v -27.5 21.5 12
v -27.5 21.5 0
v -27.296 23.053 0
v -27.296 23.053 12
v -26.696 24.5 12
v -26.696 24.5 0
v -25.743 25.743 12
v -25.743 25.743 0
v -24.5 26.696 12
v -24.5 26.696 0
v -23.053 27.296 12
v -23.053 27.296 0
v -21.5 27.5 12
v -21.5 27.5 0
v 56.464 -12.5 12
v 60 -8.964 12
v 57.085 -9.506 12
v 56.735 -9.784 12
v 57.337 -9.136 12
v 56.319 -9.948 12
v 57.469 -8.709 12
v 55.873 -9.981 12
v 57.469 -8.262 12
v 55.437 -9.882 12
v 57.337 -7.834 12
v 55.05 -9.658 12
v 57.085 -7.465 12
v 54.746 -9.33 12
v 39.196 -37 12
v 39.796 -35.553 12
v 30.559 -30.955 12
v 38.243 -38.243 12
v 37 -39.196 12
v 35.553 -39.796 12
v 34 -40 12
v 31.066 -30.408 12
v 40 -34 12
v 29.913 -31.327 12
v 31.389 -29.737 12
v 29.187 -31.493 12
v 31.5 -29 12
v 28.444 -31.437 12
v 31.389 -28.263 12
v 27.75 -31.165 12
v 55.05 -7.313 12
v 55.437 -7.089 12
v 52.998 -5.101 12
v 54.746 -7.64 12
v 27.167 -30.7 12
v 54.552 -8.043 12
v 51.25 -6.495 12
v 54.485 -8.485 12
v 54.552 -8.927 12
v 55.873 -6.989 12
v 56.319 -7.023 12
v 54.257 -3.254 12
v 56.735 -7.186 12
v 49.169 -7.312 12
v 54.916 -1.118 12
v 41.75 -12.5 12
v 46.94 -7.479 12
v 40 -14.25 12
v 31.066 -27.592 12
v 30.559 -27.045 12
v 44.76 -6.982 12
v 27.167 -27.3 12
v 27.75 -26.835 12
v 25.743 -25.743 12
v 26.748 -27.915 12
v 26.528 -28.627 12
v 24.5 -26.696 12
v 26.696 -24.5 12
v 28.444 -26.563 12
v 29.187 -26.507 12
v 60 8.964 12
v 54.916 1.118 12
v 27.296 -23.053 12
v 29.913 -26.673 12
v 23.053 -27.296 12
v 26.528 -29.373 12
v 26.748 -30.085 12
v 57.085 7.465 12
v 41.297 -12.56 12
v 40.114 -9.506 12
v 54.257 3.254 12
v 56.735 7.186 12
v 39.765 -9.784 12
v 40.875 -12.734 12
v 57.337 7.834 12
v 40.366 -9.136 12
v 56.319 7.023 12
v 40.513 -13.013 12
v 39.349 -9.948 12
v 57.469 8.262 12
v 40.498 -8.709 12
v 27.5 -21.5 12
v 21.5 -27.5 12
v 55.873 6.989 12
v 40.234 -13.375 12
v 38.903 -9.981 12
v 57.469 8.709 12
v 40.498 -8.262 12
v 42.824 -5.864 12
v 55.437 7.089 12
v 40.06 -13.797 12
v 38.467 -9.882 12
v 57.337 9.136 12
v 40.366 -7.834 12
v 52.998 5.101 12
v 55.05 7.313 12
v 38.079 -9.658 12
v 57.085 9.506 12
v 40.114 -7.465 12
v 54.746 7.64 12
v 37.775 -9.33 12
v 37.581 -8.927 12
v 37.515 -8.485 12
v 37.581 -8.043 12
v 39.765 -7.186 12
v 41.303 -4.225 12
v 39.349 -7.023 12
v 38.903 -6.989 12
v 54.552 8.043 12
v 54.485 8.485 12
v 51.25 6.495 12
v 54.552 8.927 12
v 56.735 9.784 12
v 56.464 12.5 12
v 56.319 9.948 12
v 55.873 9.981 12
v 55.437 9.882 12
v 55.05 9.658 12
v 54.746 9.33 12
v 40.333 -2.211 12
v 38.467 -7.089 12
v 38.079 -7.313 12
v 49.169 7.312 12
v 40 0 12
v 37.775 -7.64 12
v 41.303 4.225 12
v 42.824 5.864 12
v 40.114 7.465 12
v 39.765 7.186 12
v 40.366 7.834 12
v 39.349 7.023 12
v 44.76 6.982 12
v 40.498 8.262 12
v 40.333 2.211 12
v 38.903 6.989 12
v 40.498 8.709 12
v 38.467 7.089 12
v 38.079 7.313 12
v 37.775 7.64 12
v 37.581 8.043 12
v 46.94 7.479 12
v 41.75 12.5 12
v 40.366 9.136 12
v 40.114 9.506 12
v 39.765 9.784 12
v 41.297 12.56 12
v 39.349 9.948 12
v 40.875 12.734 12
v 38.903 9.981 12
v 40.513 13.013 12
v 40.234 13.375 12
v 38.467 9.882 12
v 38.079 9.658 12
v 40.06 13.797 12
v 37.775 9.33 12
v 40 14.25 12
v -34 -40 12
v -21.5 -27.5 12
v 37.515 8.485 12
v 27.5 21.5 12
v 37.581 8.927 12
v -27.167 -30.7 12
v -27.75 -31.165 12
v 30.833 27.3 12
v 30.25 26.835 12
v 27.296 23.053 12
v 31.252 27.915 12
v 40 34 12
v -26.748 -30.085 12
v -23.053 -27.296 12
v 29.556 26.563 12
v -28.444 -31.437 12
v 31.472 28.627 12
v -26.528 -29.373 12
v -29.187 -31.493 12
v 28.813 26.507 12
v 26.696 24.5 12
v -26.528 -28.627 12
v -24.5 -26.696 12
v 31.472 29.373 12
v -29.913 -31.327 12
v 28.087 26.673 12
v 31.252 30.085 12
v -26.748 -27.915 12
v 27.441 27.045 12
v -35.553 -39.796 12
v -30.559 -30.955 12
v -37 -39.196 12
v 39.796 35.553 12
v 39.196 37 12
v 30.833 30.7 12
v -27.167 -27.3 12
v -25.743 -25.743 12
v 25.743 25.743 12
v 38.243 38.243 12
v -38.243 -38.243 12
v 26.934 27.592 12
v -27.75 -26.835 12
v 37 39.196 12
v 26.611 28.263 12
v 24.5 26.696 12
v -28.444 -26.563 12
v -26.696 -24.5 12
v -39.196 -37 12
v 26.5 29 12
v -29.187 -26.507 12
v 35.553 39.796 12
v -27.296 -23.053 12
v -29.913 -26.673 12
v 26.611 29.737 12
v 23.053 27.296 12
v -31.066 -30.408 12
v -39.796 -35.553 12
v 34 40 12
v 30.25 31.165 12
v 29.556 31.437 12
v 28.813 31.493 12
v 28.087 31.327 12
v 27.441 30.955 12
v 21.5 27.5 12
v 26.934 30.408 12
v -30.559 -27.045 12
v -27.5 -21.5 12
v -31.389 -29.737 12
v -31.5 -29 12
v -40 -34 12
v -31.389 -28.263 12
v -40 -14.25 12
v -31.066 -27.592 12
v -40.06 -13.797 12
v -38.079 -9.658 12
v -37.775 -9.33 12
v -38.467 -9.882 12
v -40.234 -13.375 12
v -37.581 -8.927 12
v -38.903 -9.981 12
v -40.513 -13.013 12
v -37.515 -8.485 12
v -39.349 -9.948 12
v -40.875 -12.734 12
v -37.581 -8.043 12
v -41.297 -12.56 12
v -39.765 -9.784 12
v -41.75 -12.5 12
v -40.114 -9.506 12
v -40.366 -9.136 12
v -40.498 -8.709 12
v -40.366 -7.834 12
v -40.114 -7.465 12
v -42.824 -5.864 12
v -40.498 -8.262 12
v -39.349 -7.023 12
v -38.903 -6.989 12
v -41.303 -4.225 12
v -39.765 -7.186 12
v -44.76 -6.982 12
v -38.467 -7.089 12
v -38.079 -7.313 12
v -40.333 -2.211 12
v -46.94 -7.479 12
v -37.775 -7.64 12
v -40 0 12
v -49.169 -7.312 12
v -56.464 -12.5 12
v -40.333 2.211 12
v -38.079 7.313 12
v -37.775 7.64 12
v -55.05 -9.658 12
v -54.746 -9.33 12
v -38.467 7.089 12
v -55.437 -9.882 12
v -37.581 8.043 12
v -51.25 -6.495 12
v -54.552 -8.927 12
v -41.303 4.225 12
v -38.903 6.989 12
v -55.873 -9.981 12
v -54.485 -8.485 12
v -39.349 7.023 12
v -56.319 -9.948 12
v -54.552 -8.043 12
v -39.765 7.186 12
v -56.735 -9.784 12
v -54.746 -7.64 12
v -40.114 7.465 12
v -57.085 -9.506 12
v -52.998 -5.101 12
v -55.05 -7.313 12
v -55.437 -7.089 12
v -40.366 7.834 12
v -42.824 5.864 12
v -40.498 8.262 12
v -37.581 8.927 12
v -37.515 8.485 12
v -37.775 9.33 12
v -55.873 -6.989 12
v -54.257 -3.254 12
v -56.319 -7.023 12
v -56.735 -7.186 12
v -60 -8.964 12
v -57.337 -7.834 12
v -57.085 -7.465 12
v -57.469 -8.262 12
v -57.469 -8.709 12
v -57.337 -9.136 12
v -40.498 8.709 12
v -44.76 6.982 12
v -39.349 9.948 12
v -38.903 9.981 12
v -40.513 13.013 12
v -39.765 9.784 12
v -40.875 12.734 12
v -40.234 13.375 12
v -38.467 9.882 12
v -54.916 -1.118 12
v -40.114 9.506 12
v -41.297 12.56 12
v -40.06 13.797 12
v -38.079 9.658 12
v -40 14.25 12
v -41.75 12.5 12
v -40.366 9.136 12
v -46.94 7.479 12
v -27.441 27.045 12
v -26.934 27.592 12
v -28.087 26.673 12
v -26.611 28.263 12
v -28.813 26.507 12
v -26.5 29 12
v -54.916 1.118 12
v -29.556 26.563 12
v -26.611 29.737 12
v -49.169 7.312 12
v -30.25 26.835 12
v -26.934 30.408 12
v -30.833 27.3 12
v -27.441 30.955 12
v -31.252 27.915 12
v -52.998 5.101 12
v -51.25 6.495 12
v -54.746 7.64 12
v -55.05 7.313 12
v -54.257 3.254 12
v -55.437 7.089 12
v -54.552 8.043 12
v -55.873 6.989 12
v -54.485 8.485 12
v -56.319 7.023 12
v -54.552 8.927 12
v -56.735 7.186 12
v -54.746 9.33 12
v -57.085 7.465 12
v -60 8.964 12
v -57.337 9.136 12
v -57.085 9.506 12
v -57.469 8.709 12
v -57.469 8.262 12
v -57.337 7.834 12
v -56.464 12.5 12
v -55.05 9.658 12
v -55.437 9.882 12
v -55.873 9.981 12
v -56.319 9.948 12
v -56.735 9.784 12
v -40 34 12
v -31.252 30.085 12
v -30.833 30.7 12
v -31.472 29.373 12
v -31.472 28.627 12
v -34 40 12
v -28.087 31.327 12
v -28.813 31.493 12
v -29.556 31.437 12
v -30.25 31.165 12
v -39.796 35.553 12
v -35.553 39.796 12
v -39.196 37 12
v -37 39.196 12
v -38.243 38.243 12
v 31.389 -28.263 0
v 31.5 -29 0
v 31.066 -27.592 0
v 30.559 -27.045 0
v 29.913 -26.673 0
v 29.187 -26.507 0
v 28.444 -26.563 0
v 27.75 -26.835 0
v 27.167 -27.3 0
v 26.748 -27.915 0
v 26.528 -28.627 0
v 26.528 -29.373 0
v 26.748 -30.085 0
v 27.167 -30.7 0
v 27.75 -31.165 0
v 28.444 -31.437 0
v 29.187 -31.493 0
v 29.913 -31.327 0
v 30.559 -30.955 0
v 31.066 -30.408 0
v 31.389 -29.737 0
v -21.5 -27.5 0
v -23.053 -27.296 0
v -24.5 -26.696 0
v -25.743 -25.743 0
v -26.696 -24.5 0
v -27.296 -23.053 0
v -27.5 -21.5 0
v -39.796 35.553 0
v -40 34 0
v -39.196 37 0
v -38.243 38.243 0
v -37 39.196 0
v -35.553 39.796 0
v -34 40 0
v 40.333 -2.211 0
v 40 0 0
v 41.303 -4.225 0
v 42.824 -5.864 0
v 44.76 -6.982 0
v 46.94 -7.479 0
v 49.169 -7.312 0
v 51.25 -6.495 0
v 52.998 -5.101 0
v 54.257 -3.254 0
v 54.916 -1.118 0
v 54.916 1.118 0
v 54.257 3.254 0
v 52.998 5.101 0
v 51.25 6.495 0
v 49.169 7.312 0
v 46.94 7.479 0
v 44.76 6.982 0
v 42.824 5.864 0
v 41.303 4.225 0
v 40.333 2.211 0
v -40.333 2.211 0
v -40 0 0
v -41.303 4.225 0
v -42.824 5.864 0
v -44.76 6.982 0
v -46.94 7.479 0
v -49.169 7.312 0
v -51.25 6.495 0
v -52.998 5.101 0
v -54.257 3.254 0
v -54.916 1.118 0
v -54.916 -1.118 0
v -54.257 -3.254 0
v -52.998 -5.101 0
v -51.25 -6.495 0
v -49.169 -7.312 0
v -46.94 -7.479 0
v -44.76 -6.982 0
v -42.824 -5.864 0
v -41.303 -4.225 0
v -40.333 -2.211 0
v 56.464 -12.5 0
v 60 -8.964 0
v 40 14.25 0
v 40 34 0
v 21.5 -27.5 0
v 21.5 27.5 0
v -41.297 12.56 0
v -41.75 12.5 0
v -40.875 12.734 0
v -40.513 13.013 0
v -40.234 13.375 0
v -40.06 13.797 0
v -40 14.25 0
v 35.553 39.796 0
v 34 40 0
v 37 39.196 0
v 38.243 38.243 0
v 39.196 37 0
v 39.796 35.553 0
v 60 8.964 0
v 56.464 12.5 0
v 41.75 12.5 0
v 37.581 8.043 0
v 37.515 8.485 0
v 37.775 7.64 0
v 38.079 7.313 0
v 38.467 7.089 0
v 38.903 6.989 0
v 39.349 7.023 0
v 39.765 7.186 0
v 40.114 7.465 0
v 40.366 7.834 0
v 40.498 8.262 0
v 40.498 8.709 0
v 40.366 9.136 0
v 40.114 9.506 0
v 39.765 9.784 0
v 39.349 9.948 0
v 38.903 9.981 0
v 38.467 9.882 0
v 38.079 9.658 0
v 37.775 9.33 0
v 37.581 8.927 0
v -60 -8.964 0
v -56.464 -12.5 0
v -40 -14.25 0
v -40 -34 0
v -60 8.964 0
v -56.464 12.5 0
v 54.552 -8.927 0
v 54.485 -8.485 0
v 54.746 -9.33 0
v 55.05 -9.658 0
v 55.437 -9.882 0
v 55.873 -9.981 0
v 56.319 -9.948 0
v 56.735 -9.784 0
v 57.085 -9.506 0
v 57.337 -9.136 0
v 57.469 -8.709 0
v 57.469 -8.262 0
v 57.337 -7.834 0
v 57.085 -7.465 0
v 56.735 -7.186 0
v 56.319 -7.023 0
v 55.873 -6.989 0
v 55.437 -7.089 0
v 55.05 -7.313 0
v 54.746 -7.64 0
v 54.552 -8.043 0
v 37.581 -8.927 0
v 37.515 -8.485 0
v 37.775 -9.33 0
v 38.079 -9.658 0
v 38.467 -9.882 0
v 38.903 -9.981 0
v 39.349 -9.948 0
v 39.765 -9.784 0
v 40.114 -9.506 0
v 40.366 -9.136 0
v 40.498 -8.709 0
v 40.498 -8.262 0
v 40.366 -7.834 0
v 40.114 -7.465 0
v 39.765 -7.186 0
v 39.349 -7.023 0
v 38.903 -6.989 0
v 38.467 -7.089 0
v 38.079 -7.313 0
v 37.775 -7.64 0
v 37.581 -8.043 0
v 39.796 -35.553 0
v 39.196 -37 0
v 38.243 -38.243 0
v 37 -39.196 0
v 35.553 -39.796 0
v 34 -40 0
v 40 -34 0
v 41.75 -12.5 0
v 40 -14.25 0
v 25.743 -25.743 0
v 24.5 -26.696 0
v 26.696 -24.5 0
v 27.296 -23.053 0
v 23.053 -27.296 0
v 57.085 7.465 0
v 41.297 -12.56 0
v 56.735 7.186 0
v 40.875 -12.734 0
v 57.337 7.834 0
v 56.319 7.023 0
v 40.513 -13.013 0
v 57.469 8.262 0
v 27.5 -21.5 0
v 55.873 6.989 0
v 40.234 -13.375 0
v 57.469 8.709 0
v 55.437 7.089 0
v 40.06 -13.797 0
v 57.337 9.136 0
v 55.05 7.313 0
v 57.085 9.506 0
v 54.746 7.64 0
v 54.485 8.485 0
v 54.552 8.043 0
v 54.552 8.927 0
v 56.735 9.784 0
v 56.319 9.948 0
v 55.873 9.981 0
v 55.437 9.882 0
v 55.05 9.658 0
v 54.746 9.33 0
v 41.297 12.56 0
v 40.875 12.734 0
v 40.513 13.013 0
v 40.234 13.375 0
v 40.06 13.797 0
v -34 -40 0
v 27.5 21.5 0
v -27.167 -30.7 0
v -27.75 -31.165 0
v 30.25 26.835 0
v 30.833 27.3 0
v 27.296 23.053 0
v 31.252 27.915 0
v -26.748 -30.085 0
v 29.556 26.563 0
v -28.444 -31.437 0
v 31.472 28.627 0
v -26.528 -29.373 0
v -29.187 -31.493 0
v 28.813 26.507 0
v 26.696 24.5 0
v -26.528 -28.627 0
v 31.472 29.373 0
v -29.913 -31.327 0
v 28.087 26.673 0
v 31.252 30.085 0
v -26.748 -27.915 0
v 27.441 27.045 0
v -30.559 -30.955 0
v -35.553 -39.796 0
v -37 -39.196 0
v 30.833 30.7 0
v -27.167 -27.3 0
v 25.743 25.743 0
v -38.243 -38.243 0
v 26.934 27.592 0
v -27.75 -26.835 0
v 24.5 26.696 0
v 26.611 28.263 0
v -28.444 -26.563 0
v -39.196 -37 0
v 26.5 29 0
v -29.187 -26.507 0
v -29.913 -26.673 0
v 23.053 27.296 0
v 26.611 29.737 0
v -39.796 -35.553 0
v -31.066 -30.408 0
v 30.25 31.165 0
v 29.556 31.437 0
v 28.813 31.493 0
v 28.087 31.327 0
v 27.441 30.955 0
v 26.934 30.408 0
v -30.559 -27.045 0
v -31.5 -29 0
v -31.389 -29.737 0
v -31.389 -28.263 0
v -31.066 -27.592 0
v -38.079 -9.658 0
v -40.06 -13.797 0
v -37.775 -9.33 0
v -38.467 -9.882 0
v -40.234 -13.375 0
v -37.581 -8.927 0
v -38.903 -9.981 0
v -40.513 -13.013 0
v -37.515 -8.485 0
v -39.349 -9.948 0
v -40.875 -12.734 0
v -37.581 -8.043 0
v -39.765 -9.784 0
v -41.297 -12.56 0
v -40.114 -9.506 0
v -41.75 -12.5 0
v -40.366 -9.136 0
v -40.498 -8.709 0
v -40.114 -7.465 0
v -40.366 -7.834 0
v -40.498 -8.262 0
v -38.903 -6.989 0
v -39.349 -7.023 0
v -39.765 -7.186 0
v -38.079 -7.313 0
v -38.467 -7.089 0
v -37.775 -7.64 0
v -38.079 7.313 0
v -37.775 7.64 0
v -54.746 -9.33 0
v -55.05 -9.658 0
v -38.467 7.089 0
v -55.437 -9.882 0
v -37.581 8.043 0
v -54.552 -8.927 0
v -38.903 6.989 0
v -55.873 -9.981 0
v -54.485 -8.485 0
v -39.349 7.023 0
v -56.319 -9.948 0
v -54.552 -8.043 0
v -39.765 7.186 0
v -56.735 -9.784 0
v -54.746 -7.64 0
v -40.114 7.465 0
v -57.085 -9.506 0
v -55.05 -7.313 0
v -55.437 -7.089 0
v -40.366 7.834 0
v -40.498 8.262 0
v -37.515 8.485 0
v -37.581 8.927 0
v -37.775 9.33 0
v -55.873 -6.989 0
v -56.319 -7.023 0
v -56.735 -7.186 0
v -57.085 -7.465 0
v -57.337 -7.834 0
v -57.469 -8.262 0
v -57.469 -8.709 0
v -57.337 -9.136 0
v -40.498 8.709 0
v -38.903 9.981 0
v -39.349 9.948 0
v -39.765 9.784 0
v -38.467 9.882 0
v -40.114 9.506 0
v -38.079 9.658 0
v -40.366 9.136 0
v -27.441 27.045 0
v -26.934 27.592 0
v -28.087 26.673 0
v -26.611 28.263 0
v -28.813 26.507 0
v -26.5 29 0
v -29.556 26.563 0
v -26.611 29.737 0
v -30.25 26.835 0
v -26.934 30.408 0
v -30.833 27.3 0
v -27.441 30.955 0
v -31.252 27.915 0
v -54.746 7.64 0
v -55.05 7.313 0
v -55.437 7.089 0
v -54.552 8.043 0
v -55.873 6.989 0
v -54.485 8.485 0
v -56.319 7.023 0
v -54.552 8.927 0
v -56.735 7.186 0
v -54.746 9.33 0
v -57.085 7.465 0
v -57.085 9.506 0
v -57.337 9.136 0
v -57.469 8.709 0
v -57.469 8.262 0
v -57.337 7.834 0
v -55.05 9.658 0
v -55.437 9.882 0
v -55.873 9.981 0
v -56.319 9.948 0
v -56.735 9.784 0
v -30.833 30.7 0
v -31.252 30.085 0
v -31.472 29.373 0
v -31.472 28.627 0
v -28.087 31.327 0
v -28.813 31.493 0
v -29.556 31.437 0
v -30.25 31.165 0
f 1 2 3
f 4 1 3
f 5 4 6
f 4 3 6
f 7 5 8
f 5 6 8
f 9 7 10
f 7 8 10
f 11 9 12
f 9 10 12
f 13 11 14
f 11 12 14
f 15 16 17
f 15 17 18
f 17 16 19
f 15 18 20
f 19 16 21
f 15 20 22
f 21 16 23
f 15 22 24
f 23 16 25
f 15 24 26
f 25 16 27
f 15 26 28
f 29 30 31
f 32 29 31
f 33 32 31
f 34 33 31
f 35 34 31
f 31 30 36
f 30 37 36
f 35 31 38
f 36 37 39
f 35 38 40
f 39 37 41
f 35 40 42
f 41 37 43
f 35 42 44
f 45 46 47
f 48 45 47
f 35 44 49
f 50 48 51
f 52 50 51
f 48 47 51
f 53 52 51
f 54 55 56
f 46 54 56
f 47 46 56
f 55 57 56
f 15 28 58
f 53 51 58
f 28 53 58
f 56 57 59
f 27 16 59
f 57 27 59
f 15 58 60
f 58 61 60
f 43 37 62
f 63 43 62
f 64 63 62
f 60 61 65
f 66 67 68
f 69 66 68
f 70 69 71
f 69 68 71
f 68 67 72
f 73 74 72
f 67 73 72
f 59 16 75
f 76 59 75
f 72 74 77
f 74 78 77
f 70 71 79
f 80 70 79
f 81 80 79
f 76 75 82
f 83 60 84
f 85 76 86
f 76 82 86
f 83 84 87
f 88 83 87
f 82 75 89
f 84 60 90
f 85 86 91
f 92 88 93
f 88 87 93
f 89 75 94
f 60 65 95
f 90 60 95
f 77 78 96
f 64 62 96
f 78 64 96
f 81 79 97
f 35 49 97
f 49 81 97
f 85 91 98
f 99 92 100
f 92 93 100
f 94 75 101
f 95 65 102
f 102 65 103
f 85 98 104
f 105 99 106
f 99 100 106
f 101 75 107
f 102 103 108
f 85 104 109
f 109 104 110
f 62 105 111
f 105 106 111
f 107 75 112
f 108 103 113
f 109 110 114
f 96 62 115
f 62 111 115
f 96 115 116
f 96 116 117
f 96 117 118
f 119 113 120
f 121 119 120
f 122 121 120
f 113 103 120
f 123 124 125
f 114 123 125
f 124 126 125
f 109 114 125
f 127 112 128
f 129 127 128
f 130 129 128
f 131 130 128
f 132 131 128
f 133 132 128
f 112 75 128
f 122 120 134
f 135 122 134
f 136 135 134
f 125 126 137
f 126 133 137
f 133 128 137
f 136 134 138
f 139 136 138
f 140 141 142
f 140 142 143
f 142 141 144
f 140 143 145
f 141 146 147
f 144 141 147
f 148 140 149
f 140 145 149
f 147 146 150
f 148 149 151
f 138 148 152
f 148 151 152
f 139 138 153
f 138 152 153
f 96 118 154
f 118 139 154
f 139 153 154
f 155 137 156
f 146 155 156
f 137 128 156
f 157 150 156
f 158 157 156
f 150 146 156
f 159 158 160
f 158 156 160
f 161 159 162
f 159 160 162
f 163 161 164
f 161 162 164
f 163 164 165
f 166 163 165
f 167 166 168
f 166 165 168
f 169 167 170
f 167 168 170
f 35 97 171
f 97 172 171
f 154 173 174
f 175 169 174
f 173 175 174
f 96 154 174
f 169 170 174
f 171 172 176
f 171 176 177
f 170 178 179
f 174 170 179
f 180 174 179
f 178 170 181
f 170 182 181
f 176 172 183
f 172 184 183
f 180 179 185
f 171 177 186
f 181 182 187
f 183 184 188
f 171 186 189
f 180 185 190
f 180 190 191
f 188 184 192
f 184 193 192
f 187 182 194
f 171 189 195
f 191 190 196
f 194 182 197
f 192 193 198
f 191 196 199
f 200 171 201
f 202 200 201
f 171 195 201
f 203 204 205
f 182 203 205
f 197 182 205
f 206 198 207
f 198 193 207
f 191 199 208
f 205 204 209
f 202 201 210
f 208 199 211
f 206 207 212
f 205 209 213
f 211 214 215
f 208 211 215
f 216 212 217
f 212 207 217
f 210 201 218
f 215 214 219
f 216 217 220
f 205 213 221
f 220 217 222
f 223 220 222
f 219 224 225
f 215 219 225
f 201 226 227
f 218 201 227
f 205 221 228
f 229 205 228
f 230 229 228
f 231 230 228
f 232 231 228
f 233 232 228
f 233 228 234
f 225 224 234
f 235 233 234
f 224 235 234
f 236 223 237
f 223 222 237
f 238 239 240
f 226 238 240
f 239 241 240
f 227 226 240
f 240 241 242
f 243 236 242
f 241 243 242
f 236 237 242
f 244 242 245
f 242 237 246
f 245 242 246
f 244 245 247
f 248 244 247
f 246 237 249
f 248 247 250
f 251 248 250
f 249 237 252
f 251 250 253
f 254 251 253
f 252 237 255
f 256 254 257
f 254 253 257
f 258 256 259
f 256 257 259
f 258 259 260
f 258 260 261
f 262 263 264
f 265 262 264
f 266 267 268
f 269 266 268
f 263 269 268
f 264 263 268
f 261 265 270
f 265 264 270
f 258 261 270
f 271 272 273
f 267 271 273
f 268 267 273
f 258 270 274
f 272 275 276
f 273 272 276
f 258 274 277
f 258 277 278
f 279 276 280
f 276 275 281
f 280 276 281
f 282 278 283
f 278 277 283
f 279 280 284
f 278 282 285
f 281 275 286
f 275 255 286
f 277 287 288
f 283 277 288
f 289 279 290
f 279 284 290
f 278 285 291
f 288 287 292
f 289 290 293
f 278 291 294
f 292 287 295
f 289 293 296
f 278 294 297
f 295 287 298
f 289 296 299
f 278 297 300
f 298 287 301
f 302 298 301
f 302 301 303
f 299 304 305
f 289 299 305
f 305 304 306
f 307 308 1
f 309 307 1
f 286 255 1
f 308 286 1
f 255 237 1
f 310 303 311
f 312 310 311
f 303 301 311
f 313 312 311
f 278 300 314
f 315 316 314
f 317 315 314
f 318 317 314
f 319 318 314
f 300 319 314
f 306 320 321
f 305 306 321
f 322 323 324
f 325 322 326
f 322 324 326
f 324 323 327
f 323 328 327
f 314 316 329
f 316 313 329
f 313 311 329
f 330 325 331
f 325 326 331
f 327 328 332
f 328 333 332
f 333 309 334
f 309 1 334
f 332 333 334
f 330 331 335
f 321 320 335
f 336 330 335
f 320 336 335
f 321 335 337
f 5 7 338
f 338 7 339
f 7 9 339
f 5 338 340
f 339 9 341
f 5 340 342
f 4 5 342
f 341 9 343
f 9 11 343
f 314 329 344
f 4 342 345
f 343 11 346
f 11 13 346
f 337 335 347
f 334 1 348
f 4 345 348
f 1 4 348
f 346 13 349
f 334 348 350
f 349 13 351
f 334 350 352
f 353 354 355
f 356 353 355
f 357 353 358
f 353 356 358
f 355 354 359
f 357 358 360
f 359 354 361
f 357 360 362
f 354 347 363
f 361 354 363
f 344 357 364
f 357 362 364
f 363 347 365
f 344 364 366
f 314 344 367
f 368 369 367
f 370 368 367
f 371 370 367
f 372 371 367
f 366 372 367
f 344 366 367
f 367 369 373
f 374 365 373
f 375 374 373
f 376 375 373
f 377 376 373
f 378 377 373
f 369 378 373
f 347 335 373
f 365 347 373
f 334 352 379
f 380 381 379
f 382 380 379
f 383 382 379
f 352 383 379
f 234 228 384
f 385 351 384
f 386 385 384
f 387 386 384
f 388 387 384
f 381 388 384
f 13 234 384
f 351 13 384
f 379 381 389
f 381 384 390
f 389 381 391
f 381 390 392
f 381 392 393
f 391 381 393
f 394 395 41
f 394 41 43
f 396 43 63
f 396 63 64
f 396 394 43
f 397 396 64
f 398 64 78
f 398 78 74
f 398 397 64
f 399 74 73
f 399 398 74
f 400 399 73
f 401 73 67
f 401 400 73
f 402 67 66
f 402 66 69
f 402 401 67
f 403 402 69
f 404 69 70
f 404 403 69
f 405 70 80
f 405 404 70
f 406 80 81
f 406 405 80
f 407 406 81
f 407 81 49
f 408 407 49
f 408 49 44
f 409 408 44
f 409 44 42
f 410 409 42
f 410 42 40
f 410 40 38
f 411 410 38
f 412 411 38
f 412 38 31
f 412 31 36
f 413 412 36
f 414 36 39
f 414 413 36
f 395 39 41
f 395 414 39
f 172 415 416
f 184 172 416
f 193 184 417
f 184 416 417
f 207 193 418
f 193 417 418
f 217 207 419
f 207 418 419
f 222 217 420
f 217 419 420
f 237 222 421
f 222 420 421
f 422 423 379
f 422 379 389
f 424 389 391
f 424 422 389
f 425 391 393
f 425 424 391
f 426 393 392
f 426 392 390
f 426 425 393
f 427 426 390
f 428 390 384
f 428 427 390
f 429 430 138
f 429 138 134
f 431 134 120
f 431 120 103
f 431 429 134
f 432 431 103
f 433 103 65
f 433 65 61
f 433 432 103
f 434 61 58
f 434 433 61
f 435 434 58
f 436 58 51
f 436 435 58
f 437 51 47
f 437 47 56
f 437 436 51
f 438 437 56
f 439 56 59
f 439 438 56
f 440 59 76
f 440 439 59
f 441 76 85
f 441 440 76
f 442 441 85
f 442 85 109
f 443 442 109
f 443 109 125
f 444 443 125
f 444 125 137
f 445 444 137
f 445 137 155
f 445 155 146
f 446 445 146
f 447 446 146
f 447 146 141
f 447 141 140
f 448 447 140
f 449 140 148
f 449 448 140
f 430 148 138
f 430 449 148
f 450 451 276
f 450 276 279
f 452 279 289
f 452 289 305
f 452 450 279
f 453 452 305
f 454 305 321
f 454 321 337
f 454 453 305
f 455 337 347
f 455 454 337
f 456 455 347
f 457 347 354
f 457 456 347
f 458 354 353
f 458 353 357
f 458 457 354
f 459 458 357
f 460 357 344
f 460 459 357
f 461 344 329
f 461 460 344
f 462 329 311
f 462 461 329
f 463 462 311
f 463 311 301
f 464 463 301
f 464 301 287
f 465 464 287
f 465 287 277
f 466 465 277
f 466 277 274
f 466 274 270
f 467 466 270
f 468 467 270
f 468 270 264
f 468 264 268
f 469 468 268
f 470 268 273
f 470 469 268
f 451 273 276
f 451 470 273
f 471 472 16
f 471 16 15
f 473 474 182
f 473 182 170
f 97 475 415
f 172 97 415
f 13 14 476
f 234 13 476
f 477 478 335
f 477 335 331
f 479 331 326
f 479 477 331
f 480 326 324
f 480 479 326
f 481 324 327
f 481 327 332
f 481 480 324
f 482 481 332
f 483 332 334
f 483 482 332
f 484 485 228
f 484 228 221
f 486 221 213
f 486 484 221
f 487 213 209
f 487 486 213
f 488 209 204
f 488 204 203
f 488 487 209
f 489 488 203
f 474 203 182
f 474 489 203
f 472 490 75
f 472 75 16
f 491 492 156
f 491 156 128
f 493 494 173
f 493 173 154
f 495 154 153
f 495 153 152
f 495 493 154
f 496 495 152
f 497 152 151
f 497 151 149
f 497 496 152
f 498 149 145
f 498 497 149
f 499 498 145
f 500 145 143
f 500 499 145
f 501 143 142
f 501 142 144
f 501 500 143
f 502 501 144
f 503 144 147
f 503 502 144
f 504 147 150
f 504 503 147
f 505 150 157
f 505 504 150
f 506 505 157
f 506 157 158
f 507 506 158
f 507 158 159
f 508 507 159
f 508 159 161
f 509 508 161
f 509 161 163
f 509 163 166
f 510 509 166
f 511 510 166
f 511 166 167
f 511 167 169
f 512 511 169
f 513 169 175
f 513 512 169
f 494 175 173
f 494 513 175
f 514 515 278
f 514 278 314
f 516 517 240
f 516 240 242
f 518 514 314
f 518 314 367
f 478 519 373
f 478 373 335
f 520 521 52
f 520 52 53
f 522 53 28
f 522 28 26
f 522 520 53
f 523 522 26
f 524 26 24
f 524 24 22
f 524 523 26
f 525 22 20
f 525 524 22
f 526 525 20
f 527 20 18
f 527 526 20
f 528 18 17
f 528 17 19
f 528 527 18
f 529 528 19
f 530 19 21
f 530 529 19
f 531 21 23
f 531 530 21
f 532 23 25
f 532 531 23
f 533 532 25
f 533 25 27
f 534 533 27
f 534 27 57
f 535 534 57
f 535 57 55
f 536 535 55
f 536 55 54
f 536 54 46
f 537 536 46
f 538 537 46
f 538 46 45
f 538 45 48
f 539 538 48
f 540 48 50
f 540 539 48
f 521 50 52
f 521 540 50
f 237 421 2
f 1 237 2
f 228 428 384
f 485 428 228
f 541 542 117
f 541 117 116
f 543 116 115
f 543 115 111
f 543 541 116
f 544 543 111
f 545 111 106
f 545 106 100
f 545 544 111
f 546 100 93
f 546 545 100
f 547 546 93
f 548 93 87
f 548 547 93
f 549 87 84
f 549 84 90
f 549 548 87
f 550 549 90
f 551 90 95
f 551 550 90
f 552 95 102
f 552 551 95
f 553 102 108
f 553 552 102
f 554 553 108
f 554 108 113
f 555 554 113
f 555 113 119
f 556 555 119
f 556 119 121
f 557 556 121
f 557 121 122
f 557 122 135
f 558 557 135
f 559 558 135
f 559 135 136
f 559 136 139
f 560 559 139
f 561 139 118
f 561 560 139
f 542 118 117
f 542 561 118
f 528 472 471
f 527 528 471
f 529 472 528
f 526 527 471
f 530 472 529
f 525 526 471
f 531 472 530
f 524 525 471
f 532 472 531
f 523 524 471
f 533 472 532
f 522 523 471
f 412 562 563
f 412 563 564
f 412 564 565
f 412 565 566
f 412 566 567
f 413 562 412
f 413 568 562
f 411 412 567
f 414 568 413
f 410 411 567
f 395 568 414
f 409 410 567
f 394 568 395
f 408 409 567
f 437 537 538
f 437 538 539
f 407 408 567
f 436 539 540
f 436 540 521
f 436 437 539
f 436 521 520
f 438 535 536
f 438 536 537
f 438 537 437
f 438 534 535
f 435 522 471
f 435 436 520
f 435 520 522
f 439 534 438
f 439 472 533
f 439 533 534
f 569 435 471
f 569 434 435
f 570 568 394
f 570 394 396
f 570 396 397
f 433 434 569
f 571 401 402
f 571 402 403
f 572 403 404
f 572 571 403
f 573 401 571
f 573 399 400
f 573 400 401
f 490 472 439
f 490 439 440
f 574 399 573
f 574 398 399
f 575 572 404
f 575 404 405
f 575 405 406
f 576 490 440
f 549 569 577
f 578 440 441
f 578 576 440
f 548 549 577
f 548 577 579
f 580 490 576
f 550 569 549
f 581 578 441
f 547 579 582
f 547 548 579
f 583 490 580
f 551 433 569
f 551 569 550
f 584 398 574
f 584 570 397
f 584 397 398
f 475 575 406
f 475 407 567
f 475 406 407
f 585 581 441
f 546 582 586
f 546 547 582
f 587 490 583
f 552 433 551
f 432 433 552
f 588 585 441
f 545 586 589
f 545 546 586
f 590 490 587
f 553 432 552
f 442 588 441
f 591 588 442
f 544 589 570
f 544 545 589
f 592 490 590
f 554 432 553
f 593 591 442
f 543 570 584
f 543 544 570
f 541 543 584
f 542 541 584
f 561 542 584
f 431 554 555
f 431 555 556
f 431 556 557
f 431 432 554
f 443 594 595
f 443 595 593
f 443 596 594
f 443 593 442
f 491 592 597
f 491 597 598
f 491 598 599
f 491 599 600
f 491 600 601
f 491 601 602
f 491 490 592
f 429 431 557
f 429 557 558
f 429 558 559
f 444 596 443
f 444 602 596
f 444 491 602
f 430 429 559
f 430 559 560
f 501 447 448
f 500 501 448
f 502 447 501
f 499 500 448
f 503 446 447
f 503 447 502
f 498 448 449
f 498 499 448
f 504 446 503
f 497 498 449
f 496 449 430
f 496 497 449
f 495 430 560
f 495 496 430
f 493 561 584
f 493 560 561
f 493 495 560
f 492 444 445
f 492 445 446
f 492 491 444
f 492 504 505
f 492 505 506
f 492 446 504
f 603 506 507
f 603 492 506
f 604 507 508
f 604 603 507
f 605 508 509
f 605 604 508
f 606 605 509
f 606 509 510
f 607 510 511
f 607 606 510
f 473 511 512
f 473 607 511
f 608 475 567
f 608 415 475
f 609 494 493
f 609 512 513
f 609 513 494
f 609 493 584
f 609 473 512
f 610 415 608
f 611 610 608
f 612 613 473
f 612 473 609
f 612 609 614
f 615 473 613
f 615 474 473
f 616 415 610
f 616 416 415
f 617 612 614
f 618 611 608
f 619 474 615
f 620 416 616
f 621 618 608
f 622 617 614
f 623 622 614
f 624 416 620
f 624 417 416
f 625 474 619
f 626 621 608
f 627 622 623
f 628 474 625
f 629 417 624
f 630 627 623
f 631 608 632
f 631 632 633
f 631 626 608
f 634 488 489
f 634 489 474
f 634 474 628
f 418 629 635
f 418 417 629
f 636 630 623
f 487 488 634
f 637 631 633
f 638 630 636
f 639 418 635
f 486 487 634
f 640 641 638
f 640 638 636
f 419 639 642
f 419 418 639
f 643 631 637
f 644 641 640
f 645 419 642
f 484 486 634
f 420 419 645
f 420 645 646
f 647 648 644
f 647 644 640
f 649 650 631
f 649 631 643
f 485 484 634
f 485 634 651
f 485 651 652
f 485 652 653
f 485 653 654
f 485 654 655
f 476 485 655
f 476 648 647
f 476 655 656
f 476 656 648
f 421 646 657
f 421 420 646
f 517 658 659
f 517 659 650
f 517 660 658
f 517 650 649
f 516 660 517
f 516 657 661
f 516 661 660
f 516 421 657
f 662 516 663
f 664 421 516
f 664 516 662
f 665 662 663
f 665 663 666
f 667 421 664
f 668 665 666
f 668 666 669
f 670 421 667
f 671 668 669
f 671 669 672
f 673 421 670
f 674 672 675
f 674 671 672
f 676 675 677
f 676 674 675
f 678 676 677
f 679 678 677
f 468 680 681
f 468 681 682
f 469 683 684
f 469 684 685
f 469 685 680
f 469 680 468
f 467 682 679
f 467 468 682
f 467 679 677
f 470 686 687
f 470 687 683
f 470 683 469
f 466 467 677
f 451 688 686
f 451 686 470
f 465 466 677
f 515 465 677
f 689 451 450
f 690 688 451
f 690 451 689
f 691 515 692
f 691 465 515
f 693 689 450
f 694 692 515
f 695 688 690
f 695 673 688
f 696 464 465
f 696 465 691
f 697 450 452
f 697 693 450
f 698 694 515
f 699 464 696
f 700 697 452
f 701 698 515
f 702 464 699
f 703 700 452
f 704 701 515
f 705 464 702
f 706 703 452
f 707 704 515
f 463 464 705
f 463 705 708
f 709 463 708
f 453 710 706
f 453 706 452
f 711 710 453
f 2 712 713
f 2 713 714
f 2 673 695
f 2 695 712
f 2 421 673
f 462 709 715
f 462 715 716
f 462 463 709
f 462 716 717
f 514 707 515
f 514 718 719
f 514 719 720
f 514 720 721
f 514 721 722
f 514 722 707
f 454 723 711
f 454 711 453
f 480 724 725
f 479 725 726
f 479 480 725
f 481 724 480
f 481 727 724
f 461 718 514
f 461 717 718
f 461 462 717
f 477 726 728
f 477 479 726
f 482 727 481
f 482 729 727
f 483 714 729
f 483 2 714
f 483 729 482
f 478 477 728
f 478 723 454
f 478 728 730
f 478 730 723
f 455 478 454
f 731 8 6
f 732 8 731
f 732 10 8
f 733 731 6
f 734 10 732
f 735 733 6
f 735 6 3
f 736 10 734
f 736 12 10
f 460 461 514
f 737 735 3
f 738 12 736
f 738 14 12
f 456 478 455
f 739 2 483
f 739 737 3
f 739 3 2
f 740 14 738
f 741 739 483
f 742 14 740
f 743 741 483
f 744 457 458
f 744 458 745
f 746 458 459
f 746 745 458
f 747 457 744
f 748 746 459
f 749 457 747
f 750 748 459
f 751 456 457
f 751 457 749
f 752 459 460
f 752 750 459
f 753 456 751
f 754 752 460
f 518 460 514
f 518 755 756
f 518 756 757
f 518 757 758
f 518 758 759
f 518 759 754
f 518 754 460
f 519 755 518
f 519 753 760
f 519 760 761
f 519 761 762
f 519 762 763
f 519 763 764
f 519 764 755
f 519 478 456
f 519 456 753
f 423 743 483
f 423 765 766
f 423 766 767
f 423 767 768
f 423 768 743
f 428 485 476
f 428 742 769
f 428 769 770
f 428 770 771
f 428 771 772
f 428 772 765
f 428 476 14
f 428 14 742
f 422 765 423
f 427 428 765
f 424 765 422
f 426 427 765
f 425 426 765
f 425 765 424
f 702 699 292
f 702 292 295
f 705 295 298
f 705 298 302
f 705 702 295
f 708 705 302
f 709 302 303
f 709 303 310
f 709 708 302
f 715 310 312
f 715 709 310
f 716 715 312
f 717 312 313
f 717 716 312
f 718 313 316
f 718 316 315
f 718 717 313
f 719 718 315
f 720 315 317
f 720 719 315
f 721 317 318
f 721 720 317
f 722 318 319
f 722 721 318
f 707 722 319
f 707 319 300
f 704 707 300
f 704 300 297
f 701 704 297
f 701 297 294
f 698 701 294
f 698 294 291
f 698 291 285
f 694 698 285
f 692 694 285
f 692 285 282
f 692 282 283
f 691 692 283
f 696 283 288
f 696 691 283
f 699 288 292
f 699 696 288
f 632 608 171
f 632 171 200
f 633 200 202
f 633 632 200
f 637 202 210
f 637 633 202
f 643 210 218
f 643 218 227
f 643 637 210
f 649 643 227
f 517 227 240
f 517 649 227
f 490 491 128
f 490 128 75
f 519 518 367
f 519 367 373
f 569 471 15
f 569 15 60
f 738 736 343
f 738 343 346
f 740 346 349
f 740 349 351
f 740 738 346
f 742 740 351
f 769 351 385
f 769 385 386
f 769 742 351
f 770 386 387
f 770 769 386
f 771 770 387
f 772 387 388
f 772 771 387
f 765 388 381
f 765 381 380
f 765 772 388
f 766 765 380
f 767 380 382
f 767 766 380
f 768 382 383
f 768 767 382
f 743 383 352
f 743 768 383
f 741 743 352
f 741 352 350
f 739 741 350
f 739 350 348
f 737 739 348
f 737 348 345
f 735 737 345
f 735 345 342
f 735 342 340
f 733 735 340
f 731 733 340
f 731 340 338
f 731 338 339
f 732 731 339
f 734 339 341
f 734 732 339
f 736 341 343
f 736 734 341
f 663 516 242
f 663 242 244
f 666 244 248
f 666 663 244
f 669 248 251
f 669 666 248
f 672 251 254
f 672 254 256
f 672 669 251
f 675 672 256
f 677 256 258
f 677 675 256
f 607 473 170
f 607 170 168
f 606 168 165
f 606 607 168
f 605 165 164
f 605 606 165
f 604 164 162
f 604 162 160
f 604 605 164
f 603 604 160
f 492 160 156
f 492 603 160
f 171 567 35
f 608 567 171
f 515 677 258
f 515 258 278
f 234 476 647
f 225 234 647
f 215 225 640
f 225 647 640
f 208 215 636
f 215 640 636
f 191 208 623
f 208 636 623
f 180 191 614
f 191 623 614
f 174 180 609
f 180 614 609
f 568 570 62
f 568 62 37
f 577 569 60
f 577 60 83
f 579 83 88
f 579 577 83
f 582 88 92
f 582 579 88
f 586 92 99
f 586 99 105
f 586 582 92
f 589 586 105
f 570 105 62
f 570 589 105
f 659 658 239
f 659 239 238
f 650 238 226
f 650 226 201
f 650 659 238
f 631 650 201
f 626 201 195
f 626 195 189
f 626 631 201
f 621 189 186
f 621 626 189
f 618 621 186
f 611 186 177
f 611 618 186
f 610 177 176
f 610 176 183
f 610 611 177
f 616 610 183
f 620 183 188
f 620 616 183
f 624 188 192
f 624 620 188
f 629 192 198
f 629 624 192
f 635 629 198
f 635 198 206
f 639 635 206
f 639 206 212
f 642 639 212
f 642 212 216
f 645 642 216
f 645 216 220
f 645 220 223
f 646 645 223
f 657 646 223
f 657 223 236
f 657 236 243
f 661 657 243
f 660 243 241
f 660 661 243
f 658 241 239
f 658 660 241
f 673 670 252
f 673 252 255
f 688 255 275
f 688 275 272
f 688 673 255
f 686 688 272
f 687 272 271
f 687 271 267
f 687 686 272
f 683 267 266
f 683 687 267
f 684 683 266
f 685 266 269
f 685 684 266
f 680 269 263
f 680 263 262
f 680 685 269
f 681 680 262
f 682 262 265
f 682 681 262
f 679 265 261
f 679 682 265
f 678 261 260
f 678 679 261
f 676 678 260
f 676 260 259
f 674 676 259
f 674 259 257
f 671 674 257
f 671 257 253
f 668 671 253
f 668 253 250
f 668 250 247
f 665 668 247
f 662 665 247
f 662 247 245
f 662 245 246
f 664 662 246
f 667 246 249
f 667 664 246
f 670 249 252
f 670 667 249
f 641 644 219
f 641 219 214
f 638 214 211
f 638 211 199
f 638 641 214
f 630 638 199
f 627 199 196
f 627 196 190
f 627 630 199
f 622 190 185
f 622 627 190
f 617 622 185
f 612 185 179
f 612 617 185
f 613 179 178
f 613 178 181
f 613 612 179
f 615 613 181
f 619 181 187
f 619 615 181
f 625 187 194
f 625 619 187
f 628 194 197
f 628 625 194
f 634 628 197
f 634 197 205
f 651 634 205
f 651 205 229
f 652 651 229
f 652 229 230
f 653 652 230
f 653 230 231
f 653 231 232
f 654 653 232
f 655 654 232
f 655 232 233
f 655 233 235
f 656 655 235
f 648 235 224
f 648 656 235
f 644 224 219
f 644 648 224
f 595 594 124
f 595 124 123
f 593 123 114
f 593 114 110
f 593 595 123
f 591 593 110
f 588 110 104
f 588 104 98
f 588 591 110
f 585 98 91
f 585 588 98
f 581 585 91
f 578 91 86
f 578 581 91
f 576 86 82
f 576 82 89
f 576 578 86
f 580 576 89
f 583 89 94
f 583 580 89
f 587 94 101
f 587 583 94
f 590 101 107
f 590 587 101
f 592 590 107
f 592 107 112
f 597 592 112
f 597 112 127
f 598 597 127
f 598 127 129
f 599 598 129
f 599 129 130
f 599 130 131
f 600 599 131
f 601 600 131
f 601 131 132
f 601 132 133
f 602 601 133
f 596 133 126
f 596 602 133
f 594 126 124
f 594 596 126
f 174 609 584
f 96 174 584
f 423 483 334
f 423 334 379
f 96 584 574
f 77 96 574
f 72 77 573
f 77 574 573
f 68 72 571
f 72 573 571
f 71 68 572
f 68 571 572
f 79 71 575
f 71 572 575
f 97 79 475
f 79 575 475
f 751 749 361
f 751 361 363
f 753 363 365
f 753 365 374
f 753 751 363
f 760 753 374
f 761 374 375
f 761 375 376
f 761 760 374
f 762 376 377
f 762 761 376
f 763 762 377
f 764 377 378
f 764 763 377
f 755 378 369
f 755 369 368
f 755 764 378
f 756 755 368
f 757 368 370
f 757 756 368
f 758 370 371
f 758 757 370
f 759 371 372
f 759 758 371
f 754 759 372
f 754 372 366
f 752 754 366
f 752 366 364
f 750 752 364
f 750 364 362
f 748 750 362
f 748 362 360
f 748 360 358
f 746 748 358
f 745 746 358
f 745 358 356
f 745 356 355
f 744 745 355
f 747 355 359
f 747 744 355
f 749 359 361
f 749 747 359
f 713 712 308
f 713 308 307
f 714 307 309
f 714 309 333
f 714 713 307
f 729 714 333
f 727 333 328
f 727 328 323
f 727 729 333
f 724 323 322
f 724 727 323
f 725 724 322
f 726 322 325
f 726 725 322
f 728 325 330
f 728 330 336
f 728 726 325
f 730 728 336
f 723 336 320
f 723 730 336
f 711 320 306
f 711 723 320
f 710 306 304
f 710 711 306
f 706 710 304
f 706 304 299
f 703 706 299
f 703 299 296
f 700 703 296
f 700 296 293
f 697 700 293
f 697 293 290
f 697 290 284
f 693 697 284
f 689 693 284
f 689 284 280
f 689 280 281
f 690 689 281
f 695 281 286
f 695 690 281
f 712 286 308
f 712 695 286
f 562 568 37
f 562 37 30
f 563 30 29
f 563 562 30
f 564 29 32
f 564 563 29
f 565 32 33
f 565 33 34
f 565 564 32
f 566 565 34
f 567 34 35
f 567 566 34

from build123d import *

# Parameters (mm, degrees)
SKETCH1_R               = 7.5
SKETCH1_R_2             = 1.5
SKETCH1_R_3             = 2.5
BOSS_EXTRUDE1_DEPTH     = 12
CUT_EXTRUDE1_DEPTH      = 74.10266753
CUT_EXTRUDE1_DEPTH_BACK = 74.10266753


with BuildPart() as part:
    # Sketch1 → Boss-Extrude1 (new body)
    with BuildSketch(Plane.XY):
        with BuildLine():
            Line((-56.464466094, 12.5), (-41.75, 12.5))
            ThreePointArc((-41.75, 12.5), (-40.512563133, 13.012563133), (-40, 14.25))
            Line((-40, 14.25), (-40, 34))
            ThreePointArc((-40, 34), (-38.242640687, 38.242640687), (-34, 40))
            Line((-34, 40), (34, 40))
            ThreePointArc((34, 40), (38.242640687, 38.242640687), (40, 34))
            Line((40, 34), (40, 14.25))
            ThreePointArc((40, 14.25), (40.512563133, 13.012563133), (41.75, 12.5))
            Line((41.75, 12.5), (56.464466094, 12.5))
            Line((56.464466094, 12.5), (60, 8.964466094))
            Line((60, 8.964466094), (60, -8.964466094))
            Line((60, -8.964466094), (56.464466094, -12.5))
            Line((56.464466094, -12.5), (41.75, -12.5))
            ThreePointArc((41.75, -12.5), (40.512563133, -13.012563133), (40, -14.25))
            Line((40, -14.25), (40, -34))
            ThreePointArc((40, -34), (38.242640687, -38.242640687), (34, -40))
            Line((34, -40), (-34, -40))
            ThreePointArc((-34, -40), (-38.242640687, -38.242640687), (-40, -34))
            Line((-40, -34), (-40, -14.25))
            ThreePointArc((-40, -14.25), (-40.512563133, -13.012563133), (-41.75, -12.5))
            Line((-41.75, -12.5), (-56.464466094, -12.5))
            Line((-56.464466094, -12.5), (-60, -8.964466094))
            Line((-60, -8.964466094), (-60, 8.964466094))
            Line((-60, 8.964466094), (-56.464466094, 12.5))
        make_face()
        with Locations((-47.5, 0)):
            Circle(SKETCH1_R, mode=Mode.SUBTRACT)
        with Locations(Location((47.5, 0, 0), (0, 0, 180))):
            Circle(SKETCH1_R, mode=Mode.SUBTRACT)
        with Locations((-55.985281374, 8.485281374)):
            Circle(SKETCH1_R_2, mode=Mode.SUBTRACT)
        with Locations((-39.014718626, -8.485281374)):
            Circle(SKETCH1_R_2, mode=Mode.SUBTRACT)
        with Locations((-39.014718626, 8.485281374)):
            Circle(SKETCH1_R_2, mode=Mode.SUBTRACT)
        with Locations((-55.985281374, -8.485281374)):
            Circle(SKETCH1_R_2, mode=Mode.SUBTRACT)
        with Locations(Location((39.014718626, -8.485281374, 0), (0, 0, 180))):
            Circle(SKETCH1_R_2, mode=Mode.SUBTRACT)
        with Locations(Location((55.985281374, -8.485281374, 0), (0, 0, 180))):
            Circle(SKETCH1_R_2, mode=Mode.SUBTRACT)
        with Locations(Location((55.985281374, 8.485281374, 0), (0, 0, 180))):
            Circle(SKETCH1_R_2, mode=Mode.SUBTRACT)
        with Locations(Location((39.014718626, 8.485281374, 0), (0, 0, 180))):
            Circle(SKETCH1_R_2, mode=Mode.SUBTRACT)
        with Locations((-29, 29)):
            Circle(SKETCH1_R_3, mode=Mode.SUBTRACT)
        with Locations(Location((29, 29, 0), (0, 0, 180))):
            Circle(SKETCH1_R_3, mode=Mode.SUBTRACT)
        with Locations((29, -29)):
            Circle(SKETCH1_R_3, mode=Mode.SUBTRACT)
        with Locations(Location((-29, -29, 0), (0, 0, 180))):
            Circle(SKETCH1_R_3, mode=Mode.SUBTRACT)
    extrude(amount=BOSS_EXTRUDE1_DEPTH)

    # Sketch2 → Cut-Extrude1 (cut, two sides: drawn at the far end of the back side and taken through both)
    with BuildSketch(Plane.XY.offset(12).offset(-CUT_EXTRUDE1_DEPTH_BACK)):
        with BuildLine():
            Line((-21.5, 27.5), (21.5, 27.5))
            ThreePointArc((21.5, 27.5), (25.742640687, 25.742640687), (27.5, 21.5))
            Line((27.5, 21.5), (27.5, -21.5))
            ThreePointArc((27.5, -21.5), (25.742640687, -25.742640687), (21.5, -27.5))
            Line((21.5, -27.5), (-21.5, -27.5))
            ThreePointArc((-21.5, -27.5), (-25.742640687, -25.742640687), (-27.5, -21.5))
            Line((-27.5, -21.5), (-27.5, 21.5))
            ThreePointArc((-27.5, 21.5), (-25.742640687, 25.742640687), (-21.5, 27.5))
        make_face()
    extrude(amount=CUT_EXTRUDE1_DEPTH + CUT_EXTRUDE1_DEPTH_BACK, mode=Mode.SUBTRACT)


solid = part.part
